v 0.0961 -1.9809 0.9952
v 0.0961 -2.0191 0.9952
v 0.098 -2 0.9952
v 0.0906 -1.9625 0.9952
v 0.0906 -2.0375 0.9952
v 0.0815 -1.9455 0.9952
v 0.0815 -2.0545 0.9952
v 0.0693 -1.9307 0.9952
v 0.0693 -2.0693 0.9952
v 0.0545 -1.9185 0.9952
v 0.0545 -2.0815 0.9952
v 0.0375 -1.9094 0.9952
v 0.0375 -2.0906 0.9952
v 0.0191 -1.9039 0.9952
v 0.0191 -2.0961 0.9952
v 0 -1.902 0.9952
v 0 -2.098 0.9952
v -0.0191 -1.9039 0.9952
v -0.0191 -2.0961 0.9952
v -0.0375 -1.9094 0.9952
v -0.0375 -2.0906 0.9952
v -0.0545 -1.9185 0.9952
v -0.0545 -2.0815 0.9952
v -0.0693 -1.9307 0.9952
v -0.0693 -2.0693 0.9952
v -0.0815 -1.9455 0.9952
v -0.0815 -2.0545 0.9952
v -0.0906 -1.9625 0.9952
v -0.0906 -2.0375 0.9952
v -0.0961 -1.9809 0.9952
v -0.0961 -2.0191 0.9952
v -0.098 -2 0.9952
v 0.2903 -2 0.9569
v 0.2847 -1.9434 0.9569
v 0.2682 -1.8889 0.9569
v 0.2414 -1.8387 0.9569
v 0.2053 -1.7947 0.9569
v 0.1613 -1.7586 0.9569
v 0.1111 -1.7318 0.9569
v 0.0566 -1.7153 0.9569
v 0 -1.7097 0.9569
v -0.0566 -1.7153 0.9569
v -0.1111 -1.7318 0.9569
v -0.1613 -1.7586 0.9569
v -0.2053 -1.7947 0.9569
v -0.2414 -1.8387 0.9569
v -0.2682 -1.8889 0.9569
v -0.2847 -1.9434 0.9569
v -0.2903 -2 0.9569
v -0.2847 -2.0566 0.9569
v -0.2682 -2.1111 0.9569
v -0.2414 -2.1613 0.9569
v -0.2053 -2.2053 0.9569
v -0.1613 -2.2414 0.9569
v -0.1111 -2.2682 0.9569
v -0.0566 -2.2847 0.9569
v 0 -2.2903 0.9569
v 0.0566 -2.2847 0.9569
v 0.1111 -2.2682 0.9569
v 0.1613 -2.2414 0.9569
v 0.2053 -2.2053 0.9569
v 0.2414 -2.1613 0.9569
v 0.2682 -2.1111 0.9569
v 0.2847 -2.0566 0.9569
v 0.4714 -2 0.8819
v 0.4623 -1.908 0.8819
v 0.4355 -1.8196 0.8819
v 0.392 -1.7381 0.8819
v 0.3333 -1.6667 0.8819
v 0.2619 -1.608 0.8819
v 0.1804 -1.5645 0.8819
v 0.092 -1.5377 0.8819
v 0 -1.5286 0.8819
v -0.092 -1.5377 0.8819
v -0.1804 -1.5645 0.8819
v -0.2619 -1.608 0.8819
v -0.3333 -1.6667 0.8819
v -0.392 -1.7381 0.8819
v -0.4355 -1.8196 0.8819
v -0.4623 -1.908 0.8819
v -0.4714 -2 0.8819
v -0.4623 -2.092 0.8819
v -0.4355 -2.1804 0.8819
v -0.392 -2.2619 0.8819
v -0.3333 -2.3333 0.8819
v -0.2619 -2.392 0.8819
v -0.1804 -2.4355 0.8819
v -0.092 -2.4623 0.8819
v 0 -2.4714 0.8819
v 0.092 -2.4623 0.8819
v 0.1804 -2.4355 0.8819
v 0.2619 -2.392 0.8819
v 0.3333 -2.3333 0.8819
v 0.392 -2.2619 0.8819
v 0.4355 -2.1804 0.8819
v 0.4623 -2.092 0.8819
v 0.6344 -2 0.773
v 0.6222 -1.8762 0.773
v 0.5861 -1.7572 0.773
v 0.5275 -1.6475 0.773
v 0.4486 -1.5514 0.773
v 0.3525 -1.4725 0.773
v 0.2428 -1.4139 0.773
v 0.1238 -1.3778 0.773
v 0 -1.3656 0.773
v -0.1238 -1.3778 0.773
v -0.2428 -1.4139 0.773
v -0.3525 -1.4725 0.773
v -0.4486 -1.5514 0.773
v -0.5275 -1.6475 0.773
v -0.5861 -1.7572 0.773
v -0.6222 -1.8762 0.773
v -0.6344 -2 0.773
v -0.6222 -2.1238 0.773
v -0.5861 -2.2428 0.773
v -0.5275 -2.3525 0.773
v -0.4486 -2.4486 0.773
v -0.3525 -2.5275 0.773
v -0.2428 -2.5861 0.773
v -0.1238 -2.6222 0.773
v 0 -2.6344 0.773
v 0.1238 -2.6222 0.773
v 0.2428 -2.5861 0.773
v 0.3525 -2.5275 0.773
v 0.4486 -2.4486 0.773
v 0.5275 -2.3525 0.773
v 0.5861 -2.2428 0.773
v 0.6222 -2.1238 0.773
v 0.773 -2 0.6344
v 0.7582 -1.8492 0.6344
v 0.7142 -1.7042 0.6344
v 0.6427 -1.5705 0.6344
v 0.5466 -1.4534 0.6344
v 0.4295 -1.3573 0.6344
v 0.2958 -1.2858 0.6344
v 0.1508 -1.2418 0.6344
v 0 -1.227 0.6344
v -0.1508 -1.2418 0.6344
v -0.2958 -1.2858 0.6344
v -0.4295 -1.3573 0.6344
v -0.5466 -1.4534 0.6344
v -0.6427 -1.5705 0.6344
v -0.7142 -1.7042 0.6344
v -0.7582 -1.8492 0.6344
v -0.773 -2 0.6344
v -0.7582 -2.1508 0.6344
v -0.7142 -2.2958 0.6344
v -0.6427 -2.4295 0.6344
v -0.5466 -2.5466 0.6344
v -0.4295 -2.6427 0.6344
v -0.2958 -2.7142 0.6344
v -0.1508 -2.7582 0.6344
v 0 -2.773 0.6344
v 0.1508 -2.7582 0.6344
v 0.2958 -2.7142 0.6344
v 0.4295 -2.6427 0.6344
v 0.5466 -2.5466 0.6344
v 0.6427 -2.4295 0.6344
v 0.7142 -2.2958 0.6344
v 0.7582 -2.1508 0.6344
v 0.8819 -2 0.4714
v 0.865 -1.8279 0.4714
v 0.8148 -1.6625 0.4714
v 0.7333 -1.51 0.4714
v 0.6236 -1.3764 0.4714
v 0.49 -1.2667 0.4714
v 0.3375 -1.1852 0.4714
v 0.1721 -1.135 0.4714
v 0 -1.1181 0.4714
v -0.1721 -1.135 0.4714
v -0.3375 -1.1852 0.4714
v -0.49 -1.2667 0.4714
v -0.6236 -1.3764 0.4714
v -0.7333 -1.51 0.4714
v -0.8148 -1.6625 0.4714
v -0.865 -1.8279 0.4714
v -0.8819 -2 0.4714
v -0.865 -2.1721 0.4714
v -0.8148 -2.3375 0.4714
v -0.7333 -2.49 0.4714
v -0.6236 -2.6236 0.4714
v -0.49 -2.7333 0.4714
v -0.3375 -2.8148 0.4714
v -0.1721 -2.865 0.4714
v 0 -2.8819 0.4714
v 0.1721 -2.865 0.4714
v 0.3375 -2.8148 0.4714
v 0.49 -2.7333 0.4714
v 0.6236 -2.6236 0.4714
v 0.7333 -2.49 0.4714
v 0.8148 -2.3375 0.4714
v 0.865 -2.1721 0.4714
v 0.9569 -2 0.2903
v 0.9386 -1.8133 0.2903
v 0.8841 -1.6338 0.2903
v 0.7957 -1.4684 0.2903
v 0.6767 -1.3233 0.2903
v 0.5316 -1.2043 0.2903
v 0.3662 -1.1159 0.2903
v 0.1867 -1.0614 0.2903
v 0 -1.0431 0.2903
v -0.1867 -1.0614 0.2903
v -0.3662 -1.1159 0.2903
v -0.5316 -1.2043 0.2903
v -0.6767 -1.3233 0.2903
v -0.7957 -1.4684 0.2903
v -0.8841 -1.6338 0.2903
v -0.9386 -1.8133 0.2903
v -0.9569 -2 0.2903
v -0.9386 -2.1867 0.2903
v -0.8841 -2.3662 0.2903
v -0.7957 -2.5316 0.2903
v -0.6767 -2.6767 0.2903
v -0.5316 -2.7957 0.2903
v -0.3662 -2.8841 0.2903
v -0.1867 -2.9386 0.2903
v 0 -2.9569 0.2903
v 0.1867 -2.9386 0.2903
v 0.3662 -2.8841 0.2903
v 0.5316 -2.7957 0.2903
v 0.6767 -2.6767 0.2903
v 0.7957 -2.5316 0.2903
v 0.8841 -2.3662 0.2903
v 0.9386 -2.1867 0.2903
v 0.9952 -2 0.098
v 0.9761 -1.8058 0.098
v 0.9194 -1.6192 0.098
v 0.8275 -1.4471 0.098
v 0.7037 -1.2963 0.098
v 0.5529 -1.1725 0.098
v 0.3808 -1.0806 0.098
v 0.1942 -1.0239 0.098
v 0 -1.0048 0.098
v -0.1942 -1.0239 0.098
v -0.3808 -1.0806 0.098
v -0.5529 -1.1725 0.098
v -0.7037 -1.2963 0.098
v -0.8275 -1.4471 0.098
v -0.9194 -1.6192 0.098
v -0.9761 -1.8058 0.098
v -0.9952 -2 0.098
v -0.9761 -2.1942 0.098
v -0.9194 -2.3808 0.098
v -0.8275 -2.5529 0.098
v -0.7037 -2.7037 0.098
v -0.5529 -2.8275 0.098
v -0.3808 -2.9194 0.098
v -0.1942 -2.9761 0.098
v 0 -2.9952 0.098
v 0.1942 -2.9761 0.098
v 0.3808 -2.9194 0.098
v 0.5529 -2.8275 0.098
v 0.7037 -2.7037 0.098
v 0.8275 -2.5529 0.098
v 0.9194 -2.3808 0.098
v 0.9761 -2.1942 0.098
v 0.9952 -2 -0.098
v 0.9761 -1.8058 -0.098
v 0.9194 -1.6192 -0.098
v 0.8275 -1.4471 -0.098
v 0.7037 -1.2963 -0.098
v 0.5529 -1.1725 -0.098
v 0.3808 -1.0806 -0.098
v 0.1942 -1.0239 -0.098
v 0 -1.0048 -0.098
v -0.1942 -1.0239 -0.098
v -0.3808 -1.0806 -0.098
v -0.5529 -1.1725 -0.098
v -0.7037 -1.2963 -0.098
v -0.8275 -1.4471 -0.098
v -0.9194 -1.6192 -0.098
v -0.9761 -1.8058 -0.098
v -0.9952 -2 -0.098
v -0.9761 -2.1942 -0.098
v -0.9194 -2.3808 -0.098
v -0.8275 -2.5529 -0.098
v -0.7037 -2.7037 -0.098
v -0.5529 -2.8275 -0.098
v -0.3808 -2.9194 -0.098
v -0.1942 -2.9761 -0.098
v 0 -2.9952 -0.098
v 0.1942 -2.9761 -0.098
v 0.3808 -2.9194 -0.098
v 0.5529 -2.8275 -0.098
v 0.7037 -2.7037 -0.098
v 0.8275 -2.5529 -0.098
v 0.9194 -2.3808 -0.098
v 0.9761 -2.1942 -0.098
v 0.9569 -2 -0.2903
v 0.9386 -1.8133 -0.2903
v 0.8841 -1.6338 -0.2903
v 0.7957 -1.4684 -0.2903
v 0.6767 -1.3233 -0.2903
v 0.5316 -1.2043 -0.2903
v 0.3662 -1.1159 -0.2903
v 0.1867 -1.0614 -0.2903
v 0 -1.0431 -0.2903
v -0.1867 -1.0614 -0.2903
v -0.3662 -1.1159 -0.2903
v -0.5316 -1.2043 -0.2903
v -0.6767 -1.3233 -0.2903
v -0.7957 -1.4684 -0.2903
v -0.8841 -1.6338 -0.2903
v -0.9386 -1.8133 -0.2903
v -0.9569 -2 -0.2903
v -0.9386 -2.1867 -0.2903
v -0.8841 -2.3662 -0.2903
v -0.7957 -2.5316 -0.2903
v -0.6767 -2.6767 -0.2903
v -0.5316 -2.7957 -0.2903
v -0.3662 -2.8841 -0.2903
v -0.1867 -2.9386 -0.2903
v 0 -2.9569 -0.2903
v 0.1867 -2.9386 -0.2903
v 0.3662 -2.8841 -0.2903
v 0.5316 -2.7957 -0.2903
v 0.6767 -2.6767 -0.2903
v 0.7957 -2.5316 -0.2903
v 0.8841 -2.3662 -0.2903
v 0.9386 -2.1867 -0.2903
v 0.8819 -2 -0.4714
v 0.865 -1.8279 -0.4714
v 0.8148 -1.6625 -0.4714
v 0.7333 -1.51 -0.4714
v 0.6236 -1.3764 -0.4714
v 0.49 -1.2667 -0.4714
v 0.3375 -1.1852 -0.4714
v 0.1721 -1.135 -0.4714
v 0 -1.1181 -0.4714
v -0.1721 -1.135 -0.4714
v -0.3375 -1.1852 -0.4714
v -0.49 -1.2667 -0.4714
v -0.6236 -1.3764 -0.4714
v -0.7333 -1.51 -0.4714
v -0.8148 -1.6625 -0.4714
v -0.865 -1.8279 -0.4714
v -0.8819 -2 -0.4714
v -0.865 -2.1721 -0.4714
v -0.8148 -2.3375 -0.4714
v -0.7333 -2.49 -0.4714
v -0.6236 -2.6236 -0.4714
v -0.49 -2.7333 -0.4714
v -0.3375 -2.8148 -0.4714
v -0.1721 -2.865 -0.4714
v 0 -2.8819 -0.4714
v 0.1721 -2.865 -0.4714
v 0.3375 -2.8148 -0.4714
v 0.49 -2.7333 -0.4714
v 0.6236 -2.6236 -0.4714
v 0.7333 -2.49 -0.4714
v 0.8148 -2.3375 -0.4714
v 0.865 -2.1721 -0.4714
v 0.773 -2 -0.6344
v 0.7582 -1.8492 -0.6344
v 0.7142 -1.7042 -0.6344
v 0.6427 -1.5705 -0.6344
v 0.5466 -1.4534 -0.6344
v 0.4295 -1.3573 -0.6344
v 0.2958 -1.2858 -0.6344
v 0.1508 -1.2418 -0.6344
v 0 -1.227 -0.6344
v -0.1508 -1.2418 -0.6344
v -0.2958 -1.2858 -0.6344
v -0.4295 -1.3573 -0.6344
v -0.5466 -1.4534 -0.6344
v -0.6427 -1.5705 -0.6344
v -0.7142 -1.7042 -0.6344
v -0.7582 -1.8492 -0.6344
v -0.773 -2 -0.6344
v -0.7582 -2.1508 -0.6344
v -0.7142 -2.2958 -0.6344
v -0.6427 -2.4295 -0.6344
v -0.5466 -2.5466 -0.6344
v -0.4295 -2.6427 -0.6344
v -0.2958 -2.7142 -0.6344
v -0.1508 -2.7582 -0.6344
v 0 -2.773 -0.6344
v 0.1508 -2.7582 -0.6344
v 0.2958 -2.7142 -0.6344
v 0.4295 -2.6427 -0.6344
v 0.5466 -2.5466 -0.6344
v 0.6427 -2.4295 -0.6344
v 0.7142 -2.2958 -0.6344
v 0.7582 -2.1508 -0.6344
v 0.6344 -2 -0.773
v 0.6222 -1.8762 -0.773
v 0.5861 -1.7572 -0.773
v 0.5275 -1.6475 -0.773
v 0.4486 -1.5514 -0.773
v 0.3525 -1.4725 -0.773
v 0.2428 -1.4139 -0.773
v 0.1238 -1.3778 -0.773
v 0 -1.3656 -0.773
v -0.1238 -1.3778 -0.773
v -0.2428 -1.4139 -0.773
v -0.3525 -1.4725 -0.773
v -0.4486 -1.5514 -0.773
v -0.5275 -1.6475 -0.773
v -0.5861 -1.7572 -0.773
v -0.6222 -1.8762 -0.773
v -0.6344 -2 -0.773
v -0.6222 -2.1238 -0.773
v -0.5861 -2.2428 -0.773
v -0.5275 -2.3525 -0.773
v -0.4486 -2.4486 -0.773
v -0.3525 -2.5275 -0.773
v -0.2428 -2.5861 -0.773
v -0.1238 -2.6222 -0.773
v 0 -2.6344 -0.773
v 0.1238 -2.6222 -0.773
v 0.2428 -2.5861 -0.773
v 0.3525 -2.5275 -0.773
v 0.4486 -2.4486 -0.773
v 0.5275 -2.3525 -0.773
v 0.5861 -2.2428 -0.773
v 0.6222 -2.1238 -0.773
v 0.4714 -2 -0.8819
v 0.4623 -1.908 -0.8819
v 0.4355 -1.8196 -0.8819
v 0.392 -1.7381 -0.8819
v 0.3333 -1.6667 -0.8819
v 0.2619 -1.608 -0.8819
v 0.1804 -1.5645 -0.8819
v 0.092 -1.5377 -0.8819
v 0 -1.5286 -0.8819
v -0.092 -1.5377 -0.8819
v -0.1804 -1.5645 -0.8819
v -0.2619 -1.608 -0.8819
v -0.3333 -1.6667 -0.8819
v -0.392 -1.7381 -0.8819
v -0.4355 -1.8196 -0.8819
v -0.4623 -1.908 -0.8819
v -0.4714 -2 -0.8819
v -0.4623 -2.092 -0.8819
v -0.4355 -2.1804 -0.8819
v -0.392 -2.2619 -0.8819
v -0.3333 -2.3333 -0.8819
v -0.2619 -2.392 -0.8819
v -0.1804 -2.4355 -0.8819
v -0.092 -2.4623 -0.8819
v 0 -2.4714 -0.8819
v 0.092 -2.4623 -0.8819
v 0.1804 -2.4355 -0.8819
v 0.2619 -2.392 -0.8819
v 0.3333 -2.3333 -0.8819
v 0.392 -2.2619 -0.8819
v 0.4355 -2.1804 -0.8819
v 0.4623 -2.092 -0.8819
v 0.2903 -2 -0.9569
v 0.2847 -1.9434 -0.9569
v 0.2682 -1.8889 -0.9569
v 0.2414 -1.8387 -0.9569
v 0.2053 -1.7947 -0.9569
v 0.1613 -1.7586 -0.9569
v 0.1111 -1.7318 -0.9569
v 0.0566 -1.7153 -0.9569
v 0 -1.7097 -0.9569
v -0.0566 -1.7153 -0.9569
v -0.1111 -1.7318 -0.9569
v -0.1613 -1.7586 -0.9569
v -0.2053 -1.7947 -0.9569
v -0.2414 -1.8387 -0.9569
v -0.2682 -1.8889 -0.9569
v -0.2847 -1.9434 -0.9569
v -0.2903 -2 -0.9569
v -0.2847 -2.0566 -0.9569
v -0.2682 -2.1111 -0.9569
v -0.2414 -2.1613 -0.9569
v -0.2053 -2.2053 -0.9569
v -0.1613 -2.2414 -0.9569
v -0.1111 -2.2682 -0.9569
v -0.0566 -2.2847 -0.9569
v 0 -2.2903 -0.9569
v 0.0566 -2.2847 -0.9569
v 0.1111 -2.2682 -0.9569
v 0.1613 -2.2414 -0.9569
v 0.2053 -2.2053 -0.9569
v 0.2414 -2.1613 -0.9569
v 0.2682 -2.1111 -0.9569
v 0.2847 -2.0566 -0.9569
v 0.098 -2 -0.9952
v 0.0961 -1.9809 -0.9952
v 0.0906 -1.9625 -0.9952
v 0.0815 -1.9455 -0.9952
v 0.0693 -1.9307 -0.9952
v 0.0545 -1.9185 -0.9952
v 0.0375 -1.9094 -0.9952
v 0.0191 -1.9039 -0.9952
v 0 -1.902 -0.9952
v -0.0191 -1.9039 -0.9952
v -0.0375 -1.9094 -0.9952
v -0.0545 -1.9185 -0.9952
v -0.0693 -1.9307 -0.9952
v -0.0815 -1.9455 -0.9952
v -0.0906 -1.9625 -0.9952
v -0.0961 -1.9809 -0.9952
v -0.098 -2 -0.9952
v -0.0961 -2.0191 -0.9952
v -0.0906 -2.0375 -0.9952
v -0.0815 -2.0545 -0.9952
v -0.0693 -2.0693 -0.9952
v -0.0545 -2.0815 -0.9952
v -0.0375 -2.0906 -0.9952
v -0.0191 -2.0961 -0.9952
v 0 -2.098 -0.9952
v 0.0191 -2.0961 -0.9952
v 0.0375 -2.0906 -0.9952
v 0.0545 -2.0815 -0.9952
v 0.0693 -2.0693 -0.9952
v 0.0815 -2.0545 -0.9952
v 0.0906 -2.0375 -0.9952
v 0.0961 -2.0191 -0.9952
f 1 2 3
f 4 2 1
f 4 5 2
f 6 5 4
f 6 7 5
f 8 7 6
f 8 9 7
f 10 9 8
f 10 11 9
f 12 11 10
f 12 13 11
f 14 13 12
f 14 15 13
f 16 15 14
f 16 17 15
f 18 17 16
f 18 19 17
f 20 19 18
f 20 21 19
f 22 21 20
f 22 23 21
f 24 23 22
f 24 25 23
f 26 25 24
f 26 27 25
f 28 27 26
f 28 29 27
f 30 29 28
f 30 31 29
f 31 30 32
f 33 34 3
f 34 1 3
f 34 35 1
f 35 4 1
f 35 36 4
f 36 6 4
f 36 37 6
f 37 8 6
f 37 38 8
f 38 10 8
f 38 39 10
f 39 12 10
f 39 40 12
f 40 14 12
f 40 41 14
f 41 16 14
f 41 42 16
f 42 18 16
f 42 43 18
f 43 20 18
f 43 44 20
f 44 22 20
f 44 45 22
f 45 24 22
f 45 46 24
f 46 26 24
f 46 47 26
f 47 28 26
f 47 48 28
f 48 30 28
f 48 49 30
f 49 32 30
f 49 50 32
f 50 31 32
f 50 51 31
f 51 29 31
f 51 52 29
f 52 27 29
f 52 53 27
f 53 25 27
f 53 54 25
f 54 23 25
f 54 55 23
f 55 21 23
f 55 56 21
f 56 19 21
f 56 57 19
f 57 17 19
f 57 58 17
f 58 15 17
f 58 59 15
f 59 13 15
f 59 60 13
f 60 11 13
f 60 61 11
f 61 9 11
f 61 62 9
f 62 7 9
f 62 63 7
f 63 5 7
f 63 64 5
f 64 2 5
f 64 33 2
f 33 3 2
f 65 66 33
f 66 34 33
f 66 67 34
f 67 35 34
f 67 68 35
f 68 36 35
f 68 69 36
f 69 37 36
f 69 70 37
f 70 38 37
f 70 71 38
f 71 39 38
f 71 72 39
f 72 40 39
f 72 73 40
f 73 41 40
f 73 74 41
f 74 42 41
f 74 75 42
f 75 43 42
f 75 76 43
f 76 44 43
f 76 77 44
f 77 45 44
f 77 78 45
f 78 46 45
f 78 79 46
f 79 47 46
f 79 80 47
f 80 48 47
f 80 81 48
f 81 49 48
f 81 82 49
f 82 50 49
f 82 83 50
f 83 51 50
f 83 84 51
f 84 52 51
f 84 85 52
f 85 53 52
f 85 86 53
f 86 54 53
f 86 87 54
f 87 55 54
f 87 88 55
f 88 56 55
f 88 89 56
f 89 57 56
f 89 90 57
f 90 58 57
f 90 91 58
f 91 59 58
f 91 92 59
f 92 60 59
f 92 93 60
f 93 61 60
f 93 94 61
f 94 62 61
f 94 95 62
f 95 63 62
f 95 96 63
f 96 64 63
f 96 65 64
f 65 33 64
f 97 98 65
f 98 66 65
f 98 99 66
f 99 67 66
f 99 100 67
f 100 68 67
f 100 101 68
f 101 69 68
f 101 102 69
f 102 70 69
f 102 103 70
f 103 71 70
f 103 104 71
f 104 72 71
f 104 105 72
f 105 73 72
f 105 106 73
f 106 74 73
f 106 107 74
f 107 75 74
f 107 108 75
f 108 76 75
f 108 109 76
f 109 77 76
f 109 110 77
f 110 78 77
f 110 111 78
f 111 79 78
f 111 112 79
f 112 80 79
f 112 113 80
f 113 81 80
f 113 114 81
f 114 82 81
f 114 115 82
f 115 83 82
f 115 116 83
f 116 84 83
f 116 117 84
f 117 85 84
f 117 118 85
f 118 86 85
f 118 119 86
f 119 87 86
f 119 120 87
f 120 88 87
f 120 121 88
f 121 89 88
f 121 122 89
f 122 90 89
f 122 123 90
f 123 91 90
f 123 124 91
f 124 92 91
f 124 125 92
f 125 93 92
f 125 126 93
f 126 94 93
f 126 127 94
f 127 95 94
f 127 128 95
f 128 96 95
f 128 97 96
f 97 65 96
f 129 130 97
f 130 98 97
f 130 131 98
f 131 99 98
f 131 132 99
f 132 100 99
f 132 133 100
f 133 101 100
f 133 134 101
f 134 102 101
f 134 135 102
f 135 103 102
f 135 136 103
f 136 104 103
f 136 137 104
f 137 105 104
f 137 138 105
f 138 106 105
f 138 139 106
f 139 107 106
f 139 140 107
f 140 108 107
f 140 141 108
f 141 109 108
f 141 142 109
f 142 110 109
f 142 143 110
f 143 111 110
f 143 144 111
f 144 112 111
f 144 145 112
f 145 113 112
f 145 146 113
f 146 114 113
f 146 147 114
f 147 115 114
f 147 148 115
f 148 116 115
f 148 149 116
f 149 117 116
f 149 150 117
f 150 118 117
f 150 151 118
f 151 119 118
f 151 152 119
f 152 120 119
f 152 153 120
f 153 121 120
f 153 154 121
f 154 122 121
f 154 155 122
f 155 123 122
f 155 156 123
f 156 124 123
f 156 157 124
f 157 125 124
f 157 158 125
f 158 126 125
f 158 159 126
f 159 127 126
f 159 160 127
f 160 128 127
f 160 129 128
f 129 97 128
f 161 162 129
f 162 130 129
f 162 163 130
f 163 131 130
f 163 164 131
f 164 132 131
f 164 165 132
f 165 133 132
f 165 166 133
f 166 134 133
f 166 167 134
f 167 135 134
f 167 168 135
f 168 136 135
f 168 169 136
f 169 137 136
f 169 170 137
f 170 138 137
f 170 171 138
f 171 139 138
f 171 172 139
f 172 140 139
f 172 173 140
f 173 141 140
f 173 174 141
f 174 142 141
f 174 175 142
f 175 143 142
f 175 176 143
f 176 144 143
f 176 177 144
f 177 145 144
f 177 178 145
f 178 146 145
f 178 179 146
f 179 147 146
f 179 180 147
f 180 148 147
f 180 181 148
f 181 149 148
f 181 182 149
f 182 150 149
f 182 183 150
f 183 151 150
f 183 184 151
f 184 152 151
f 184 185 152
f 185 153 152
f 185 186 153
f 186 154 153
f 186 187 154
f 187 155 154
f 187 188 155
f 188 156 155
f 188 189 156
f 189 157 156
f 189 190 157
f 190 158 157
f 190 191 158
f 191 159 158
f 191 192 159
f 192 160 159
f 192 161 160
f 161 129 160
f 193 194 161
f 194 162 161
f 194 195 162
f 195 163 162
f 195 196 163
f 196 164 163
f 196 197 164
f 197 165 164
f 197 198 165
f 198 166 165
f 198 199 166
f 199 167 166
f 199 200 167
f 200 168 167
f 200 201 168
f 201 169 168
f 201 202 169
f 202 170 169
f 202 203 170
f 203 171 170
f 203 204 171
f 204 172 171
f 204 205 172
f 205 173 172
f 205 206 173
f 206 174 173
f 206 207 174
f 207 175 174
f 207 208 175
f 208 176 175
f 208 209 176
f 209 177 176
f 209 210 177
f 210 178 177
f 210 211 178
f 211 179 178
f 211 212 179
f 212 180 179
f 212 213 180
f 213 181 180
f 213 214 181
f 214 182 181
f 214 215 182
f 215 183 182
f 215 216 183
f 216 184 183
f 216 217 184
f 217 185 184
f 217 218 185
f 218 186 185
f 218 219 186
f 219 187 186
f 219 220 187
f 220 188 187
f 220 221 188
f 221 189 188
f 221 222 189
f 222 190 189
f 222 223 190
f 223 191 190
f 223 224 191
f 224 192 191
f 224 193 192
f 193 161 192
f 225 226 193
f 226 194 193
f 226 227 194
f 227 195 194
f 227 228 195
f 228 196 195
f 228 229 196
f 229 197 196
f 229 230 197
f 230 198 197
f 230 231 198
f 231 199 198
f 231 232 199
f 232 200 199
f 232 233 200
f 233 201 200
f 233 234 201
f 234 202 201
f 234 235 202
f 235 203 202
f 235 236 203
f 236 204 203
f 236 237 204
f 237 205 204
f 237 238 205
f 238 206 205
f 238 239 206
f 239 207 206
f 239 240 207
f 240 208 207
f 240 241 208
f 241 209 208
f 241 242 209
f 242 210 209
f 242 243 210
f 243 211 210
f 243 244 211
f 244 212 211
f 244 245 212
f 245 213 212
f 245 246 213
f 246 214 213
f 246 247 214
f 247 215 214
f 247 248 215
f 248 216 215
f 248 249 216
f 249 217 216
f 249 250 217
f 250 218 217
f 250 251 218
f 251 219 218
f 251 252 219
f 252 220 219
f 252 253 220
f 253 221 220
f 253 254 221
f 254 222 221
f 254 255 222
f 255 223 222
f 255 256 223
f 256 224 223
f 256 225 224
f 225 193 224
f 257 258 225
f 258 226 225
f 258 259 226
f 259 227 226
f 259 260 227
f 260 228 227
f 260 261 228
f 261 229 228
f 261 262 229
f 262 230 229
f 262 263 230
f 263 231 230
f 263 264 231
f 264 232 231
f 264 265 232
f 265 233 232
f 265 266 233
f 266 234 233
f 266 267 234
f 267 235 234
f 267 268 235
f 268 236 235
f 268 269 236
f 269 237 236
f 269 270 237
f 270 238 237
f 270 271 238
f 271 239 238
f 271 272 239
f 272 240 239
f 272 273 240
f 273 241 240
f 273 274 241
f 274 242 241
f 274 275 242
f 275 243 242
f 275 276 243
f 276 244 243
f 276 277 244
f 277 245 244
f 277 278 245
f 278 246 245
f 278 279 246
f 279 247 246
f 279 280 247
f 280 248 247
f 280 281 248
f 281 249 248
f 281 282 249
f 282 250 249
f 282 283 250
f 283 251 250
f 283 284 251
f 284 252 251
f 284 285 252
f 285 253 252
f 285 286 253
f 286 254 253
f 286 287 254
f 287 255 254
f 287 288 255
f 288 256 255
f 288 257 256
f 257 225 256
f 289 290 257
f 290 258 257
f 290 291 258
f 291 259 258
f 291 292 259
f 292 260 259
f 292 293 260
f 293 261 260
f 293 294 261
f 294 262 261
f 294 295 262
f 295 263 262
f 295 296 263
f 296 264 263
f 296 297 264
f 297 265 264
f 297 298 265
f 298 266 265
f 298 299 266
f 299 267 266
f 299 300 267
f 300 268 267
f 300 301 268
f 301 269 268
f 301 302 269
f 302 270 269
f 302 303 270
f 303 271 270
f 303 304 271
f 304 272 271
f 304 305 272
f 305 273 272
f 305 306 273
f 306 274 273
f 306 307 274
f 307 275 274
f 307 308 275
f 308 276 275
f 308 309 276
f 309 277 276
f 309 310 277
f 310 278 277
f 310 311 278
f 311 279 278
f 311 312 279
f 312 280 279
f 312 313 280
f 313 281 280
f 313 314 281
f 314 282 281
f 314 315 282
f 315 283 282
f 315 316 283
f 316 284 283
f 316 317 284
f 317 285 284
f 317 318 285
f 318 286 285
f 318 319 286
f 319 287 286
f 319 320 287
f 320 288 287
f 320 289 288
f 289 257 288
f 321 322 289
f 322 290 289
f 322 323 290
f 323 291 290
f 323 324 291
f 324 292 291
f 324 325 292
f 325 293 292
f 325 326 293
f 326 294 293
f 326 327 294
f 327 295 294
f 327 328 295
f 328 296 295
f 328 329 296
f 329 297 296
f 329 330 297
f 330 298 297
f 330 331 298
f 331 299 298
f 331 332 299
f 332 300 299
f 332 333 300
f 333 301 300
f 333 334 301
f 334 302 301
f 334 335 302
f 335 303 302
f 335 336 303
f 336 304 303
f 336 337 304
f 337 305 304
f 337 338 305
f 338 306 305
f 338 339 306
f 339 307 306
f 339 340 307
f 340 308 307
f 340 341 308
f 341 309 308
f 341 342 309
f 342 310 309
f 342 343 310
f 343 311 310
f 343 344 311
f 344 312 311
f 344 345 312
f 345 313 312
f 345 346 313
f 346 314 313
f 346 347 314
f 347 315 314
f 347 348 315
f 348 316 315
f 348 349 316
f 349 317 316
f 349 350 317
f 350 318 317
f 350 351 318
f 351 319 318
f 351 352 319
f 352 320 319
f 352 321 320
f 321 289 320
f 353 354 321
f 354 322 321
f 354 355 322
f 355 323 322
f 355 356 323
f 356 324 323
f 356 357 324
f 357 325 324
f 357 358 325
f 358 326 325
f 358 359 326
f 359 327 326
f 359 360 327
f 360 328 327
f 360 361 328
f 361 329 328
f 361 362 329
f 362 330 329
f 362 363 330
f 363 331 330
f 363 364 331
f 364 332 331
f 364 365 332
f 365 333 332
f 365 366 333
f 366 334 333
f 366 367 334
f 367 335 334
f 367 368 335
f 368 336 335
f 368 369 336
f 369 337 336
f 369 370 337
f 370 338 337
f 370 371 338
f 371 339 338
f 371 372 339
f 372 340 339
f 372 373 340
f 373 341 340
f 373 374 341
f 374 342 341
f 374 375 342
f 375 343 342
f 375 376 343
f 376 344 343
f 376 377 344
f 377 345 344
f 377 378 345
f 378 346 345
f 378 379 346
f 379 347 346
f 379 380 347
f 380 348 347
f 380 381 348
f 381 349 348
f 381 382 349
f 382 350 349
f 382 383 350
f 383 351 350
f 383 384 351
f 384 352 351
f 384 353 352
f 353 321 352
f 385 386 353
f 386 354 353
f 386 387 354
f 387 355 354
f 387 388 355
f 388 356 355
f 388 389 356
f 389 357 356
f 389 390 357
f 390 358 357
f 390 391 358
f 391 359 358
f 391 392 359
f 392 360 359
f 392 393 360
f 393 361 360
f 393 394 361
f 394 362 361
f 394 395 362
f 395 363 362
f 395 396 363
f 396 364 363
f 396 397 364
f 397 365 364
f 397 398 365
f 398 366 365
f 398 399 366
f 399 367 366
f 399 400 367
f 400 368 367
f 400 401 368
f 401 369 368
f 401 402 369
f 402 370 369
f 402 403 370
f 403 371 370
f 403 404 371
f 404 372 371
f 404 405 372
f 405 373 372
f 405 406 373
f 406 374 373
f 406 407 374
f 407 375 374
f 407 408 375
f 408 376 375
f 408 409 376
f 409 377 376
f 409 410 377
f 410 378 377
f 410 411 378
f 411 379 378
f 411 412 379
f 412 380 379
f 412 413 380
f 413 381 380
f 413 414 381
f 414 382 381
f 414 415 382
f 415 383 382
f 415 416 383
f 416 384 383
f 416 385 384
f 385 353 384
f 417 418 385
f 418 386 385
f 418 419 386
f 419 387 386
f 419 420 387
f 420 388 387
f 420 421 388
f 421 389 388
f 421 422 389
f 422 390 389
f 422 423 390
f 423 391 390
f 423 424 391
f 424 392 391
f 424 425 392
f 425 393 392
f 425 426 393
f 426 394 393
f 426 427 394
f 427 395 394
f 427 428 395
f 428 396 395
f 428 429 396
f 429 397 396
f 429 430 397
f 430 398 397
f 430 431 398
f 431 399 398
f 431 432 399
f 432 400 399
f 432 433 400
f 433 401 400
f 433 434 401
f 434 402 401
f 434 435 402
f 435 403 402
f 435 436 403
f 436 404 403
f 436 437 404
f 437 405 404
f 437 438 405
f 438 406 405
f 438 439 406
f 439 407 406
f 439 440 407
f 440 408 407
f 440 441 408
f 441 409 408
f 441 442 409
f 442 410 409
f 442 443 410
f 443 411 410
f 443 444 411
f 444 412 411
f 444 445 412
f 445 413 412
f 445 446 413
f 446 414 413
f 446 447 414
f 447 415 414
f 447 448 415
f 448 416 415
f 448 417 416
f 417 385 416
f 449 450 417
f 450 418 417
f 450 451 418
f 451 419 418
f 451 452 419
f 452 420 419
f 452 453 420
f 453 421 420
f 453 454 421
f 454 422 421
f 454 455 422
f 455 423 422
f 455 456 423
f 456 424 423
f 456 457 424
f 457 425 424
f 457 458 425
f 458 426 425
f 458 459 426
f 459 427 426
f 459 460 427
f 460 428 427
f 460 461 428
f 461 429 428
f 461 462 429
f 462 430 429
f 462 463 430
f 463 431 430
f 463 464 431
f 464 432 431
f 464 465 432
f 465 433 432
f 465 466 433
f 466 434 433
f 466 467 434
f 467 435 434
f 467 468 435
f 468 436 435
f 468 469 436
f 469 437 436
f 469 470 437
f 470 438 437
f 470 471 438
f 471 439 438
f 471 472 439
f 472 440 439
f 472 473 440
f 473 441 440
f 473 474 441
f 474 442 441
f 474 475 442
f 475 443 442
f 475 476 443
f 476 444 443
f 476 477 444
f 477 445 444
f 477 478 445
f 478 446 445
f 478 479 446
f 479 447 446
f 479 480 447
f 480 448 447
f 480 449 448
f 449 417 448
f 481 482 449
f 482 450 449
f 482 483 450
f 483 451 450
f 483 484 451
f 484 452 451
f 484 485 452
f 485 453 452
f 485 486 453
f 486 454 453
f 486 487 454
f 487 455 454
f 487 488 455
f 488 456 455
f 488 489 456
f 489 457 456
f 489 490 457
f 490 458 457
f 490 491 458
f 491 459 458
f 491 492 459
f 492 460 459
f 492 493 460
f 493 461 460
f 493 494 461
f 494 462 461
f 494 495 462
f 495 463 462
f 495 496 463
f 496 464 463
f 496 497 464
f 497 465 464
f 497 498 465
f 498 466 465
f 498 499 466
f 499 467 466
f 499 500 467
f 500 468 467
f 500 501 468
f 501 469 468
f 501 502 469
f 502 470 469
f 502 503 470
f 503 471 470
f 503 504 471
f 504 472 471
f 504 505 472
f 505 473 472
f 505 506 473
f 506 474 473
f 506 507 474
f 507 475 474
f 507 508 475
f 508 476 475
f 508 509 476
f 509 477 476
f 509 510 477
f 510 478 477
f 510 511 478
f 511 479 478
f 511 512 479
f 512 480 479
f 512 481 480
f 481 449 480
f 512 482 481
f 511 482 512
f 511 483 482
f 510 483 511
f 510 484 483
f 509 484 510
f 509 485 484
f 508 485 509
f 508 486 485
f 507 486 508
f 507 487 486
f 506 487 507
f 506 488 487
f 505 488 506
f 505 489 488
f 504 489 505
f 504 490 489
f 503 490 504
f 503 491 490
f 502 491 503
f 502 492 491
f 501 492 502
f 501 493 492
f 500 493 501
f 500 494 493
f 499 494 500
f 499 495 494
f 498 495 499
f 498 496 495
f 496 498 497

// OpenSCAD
$fn = 32;
$vpd = ((abs(sin(($t * 360))) * 10) + 5);
$vpt = [0, -1, 0];
$vpr = [63, 0, ($t * 360)];
$vpf = 25;
/* [Colors] */
//The color of the cube
cube_color = "blue"; //[red, green, blue]
/* [Animation] */
//Animation speed factor
anim_factor = 1; //[1:0.5:10]

union() {
	color(alpha = 1.0, c = cube_color) {
		cube(center = true, size = abs(sin((($t * 360) * anim_factor))));
	}
	translate(v = [0, -2, 0]) {
		color(alpha = 1.0, c = cube_color) {
			sphere(r = abs(sin(((($t * 360) * anim_factor) - 90))));
		}
	}
}
